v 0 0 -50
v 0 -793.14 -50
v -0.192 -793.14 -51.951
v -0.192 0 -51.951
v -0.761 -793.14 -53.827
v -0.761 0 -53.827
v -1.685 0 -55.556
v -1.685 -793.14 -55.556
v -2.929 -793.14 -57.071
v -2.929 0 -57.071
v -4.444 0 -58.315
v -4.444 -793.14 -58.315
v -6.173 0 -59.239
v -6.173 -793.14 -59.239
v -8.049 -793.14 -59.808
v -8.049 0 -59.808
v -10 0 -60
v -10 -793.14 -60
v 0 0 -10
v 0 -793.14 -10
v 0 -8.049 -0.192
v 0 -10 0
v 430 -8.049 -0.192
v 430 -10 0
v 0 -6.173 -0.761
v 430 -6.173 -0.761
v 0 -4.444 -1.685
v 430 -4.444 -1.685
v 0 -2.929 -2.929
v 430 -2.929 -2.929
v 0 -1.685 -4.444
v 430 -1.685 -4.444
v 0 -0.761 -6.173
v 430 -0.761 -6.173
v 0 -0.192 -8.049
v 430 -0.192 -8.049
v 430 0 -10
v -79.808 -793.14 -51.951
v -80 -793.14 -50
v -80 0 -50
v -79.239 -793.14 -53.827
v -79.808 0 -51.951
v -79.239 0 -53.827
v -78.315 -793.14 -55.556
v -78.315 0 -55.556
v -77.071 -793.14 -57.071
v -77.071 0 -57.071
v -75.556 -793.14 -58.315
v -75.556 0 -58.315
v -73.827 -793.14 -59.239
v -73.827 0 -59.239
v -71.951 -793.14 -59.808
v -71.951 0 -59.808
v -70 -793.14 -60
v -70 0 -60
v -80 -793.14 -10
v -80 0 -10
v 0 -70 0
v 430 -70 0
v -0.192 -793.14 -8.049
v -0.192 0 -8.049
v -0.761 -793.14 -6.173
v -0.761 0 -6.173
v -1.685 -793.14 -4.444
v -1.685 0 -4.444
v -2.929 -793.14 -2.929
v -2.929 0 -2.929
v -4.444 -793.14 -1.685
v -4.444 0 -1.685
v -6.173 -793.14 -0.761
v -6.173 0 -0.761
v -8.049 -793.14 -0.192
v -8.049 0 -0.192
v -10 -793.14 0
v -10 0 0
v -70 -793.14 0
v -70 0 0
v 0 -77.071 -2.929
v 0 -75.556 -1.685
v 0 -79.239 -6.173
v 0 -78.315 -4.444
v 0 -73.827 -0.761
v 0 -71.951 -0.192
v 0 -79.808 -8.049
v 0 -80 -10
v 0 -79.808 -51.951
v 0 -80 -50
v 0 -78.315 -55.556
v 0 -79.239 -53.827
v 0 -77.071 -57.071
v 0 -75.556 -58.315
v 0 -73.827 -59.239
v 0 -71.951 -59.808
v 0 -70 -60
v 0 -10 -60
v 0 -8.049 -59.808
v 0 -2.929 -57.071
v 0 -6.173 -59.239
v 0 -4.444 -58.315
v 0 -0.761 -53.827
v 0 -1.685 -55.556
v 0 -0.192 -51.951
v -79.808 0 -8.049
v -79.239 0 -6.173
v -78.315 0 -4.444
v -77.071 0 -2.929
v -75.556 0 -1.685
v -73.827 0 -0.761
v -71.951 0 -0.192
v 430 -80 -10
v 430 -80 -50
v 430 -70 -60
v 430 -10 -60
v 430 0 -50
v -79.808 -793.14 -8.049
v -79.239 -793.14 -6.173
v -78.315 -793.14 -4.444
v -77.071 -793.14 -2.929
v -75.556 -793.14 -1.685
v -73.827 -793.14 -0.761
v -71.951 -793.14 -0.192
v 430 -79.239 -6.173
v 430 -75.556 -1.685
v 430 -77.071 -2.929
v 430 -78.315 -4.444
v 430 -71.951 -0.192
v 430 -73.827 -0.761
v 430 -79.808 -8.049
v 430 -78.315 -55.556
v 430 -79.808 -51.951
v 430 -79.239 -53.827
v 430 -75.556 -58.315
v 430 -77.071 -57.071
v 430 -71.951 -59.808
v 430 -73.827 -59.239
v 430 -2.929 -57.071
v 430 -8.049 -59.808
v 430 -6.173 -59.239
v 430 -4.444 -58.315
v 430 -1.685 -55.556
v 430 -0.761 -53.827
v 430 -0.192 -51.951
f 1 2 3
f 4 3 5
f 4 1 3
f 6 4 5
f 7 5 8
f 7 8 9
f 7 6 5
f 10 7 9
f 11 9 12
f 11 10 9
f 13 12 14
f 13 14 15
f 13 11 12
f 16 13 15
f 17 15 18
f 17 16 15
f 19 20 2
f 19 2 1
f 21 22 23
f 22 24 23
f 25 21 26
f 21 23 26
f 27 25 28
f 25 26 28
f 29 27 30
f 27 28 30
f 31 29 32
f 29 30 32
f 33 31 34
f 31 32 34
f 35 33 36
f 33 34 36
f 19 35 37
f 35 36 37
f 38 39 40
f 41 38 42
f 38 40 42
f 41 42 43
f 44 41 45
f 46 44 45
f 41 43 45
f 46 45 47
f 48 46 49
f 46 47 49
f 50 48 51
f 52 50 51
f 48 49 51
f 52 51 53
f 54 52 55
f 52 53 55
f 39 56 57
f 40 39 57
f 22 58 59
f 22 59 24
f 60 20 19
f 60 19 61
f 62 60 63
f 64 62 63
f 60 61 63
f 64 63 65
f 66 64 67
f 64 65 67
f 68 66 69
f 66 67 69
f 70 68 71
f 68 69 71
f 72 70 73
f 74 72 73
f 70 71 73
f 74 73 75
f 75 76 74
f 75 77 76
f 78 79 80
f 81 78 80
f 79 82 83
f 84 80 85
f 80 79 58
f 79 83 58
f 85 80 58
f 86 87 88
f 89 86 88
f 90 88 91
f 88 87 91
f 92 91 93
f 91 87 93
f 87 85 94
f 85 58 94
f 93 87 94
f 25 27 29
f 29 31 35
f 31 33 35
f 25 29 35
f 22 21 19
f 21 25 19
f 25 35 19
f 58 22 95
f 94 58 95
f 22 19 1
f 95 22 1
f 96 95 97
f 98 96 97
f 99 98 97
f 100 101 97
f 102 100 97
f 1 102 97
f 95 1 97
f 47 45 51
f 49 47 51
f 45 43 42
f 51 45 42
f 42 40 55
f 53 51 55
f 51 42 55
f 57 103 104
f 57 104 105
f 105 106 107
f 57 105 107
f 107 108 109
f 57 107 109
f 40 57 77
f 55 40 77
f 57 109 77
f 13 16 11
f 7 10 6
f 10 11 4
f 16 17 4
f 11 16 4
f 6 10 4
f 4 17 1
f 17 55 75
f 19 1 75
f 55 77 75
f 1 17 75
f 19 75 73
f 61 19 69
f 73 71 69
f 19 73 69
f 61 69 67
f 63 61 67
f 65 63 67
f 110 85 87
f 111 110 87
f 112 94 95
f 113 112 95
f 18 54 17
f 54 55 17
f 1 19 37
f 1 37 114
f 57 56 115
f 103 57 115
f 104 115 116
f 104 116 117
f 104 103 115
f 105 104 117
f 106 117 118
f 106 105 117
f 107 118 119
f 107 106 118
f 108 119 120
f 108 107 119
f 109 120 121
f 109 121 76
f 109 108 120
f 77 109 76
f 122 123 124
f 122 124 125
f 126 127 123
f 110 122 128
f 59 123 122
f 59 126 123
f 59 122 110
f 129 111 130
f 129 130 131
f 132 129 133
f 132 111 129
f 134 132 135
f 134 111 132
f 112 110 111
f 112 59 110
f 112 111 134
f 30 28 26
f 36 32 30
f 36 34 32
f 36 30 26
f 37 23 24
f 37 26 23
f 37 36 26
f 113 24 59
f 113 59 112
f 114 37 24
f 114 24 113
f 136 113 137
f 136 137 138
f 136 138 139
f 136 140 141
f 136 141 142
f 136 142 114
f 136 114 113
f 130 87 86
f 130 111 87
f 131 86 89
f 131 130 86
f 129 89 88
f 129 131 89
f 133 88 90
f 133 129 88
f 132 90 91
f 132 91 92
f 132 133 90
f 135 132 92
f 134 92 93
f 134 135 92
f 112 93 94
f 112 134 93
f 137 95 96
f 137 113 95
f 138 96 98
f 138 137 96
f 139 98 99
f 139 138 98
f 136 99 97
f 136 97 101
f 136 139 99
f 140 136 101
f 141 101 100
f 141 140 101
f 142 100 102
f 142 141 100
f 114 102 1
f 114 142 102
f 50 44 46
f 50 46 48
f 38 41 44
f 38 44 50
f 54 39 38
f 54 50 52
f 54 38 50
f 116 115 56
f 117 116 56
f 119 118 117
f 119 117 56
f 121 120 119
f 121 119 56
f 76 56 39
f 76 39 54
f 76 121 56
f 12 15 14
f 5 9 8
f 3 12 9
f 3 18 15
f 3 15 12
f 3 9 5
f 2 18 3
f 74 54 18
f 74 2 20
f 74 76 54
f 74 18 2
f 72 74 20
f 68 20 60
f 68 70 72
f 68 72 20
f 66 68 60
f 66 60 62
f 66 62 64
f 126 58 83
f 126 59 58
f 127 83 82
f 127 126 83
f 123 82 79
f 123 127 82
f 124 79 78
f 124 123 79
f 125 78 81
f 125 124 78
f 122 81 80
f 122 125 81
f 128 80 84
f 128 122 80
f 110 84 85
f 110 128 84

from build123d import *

# Parameters (mm, degrees)
SKETCH1_W           = 80
SKETCH1_H           = 793.139508354
BOSS_EXTRUDE1_DEPTH = 60
SKETCH2_W           = 60
SKETCH2_H           = 80
BOSS_EXTRUDE2_DEPTH = 430
FILLET1_R           = 10
FILLET2_R           = 10


with BuildPart() as part:
    # Sketch1 → Boss-Extrude1 (new body)
    with BuildSketch(Plane.XY):
        with Locations((-40, -396.569754177)):
            Rectangle(SKETCH1_W, SKETCH1_H)
    extrude(amount=-BOSS_EXTRUDE1_DEPTH)

    # Fillet1
    fillet1_edges = [part.edges().sort_by_distance(p)[0] for p in [
        (-80, -396.569754177, -60),
        (0, -396.569754177, -60),
        (-80, -396.569754177, 0),
        (0, -396.569754177, 0),
    ]]
    fillet(fillet1_edges, radius=FILLET1_R)


with BuildPart() as body_2:
    # Sketch2 → Boss-Extrude2 (new body)
    with BuildSketch(Plane(origin=(0, 0, 0), x_dir=(0, 0, -1), z_dir=(1, 0, 0))):
        with Locations((30, -40)):
            Rectangle(SKETCH2_W, SKETCH2_H)
    extrude(amount=BOSS_EXTRUDE2_DEPTH)

    # Fillet2
    fillet2_edges = [body_2.edges().sort_by_distance(p)[0] for p in [
        (215, 0, 0),
        (215, 0, -60),
        (215, -80, -60),
        (215, -80, 0),
    ]]
    fillet(fillet2_edges, radius=FILLET2_R)


solid = Compound([part.part, body_2.part])
